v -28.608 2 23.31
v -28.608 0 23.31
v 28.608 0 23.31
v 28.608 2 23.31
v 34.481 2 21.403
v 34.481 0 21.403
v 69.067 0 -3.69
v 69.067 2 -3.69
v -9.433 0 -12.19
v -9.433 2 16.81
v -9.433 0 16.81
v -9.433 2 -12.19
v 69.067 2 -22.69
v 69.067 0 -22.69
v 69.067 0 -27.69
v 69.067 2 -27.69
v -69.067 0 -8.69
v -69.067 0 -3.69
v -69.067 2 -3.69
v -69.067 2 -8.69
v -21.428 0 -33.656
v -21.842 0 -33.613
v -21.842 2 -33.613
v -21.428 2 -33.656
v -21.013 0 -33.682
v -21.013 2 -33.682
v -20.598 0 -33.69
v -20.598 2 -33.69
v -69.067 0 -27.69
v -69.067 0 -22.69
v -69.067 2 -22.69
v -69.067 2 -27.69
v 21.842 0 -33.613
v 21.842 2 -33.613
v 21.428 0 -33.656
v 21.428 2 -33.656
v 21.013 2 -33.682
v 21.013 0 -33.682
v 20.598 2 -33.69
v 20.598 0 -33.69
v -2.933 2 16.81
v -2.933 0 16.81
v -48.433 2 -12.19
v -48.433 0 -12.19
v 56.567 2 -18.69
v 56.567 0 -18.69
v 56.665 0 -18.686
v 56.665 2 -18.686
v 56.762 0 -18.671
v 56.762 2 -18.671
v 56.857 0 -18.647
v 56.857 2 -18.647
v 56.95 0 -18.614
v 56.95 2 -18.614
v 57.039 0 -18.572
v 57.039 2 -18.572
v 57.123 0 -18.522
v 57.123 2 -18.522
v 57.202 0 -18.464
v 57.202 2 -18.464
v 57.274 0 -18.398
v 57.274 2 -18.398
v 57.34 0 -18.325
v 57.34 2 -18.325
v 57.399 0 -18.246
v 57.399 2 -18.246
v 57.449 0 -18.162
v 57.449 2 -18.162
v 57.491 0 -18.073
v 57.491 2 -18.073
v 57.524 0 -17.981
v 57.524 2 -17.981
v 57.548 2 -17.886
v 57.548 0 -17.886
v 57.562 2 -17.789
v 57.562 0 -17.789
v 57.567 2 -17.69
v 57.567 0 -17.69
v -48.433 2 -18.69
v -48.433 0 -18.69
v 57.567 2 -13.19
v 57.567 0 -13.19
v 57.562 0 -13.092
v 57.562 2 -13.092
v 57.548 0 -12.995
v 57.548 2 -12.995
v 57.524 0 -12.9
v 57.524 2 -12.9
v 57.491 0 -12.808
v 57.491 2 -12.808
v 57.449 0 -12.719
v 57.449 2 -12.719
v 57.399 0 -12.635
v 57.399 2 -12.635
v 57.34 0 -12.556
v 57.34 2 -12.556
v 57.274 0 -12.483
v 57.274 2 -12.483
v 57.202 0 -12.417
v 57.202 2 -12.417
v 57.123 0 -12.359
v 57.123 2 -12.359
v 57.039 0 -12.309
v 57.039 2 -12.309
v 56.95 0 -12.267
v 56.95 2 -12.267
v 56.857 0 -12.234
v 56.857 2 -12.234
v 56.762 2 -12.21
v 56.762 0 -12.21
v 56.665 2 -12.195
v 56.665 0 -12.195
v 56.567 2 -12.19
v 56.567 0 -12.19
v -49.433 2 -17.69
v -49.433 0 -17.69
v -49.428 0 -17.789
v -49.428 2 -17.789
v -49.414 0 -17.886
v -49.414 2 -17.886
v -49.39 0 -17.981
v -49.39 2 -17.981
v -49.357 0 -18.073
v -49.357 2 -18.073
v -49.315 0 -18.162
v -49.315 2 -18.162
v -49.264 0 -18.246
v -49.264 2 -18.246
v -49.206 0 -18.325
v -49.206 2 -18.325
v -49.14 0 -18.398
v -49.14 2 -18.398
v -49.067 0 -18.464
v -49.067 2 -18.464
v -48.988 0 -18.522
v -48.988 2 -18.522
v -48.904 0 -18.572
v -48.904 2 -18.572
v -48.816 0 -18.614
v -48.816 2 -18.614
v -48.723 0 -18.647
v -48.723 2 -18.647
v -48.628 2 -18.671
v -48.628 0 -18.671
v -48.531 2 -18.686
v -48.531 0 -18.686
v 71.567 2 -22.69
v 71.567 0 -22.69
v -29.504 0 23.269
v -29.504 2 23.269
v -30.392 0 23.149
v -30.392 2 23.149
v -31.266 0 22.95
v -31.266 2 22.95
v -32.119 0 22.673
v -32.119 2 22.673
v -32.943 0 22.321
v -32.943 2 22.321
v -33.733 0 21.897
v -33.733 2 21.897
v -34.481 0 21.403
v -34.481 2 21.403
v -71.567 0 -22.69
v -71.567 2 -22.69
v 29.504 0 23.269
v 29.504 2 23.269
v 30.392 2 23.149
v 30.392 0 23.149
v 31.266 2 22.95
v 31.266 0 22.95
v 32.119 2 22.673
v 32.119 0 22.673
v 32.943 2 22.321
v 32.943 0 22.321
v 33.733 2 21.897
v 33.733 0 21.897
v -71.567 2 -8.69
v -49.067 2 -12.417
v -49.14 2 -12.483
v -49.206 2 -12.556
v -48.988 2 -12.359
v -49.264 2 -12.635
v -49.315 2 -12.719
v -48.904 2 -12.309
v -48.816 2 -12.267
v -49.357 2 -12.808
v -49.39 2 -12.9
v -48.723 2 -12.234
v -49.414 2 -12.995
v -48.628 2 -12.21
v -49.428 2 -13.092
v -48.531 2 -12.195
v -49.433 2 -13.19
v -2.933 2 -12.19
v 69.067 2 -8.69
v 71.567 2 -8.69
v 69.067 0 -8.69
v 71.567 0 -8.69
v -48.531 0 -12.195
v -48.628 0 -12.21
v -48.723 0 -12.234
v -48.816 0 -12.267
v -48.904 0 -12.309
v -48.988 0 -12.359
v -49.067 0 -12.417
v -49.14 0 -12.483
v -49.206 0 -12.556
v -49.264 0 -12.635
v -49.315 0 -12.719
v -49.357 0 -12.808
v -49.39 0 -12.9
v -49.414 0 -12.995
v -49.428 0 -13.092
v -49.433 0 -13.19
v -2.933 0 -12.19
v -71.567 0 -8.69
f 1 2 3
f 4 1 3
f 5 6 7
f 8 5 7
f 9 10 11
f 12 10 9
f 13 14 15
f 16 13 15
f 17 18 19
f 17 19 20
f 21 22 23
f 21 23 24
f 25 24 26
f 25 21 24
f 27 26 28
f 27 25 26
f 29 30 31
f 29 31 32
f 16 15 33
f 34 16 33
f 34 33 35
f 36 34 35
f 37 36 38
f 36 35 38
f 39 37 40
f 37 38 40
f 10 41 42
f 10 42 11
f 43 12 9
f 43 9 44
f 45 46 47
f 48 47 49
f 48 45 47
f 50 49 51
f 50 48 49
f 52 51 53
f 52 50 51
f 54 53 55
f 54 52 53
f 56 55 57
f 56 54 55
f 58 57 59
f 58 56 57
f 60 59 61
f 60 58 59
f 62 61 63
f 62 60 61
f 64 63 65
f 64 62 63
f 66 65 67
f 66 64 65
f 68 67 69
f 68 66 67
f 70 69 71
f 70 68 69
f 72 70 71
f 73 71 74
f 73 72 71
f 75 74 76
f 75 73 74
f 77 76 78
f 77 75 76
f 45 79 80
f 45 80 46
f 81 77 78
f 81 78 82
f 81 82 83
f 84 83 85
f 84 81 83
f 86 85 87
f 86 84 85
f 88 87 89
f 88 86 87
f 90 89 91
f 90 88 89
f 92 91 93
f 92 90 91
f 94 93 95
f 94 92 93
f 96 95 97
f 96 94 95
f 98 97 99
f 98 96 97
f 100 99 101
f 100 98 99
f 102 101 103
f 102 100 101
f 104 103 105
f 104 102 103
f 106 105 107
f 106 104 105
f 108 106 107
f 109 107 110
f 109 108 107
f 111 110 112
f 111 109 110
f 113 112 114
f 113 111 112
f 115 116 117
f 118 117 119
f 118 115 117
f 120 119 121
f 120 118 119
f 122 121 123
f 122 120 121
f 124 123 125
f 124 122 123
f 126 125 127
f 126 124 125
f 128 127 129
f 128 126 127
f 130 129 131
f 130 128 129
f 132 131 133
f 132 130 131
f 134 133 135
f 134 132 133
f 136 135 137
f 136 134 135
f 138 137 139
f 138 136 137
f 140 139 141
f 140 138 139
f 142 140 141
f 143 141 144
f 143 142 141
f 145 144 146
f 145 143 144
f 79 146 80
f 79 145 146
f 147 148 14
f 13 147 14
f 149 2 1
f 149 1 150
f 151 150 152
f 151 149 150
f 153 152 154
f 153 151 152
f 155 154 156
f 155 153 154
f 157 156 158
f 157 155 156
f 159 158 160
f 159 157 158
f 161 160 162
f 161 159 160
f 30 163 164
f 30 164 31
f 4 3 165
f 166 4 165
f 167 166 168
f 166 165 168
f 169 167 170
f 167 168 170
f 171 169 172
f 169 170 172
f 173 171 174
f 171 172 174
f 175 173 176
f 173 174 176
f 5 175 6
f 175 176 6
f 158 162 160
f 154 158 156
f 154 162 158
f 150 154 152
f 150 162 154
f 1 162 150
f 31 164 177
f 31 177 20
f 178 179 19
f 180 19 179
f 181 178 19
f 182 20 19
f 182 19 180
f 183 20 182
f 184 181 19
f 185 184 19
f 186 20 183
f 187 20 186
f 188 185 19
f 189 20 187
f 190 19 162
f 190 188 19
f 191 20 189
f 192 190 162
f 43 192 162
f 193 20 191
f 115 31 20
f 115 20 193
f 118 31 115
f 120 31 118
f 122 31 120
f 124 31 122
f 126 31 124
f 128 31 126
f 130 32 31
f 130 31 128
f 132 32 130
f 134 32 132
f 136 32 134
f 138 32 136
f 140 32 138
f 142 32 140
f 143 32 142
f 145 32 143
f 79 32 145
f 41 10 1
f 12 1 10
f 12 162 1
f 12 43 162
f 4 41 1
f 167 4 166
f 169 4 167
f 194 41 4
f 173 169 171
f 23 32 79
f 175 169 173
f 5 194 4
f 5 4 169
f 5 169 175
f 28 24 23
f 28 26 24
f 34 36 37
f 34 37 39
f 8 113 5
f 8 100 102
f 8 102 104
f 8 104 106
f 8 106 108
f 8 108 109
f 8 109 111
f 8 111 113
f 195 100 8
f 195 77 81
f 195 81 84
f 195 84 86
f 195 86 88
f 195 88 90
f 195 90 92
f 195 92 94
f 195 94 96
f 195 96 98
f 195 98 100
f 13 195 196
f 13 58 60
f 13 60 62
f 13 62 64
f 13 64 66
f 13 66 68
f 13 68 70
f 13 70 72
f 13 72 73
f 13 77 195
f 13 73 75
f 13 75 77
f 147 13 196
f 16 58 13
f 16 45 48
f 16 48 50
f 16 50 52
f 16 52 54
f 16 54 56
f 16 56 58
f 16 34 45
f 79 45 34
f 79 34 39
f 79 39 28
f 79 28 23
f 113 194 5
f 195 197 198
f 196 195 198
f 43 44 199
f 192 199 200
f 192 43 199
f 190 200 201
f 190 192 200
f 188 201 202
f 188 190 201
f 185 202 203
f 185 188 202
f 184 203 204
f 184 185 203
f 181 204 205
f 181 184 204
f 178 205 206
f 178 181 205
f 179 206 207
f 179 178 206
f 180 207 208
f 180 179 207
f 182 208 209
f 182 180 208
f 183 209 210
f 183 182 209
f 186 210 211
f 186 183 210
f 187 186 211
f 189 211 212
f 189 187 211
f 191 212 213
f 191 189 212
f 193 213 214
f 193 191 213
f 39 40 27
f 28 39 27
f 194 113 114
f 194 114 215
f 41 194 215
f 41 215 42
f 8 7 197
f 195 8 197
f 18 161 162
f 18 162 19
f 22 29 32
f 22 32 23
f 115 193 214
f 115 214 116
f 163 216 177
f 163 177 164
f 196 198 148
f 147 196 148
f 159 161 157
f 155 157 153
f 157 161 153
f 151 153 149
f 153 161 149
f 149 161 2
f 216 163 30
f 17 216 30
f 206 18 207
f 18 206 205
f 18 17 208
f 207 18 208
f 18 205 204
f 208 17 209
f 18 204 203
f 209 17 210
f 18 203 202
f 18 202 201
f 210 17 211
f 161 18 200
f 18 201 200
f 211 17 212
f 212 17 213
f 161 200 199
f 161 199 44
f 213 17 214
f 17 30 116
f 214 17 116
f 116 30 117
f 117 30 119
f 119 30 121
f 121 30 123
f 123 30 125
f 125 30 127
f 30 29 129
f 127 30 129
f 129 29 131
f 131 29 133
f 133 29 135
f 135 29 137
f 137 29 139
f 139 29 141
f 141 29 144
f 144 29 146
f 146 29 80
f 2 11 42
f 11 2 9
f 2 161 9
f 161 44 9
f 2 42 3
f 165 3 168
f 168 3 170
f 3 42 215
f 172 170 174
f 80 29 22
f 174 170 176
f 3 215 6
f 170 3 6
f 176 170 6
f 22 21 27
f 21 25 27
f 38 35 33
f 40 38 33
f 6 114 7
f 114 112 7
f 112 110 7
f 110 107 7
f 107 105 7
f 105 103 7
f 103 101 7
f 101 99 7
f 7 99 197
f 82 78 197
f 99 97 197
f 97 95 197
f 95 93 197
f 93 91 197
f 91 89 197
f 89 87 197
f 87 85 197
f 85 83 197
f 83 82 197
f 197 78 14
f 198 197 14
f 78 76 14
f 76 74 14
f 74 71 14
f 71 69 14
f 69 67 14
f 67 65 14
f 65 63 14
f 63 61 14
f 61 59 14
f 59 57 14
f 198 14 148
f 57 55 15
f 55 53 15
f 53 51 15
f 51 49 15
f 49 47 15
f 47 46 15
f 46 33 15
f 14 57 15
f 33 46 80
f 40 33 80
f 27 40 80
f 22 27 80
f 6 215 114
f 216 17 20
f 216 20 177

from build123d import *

# Parameters (mm, degrees)
RESSALTO_EXTRUS_O1_DEPTH = 2
CORTE_EXTRUS_O1_DEPTH    = 3


with BuildPart() as part:
    # Esboço1 → Ressalto-extrusão1 (new body)
    with BuildSketch(Plane(origin=(0, 0, 0), x_dir=(1, 0, 0), z_dir=(0, 1, 0))):
        with BuildLine():
            Line((-69.067178301, 27.690493718), (-21.84180506, 33.612777476))
            ThreePointArc((-21.84180506, 33.612777476), (-21.220866866, 33.671045747), (-20.597504043, 33.690493718))
            Line((-20.597504043, 33.690493718), (0, 33.690493718))
            Line((0, 33.690493718), (0, -23.309506282))
            Line((0, -23.309506282), (-28.608479685, -23.309506282))
            ThreePointArc((-28.608479685, -23.309506282), (-31.695562463, -22.821073972), (-34.481079048, -21.403490265))
            Line((-34.481079048, -21.403490265), (-69.067178301, 3.690493718))
            Line((-69.067178301, 3.690493718), (-69.067178301, 8.690493718))
            Line((-69.067178301, 8.690493718), (-71.567178301, 8.690493718))
            Line((-71.567178301, 8.690493718), (-71.567178301, 22.690493718))
            Line((-71.567178301, 22.690493718), (-69.067178301, 22.690493718))
            Line((-69.067178301, 22.690493718), (-69.067178301, 27.690493718))
        make_face()
    ressalto_extrus_o1 = extrude(amount=RESSALTO_EXTRUS_O1_DEPTH)

    # Espelhar1: Ressalto-extrusão1 across plane
    add(ressalto_extrus_o1.mirror(Plane(origin=(0, 2, 23.309506282), x_dir=(0, 0, 1), z_dir=(-1, 0, 0))))

    # Esboço2 → Corte-extrusão1 (cut, through all)
    with BuildSketch(Plane(origin=(0, 2, 0), x_dir=(1, 0, 0), z_dir=(0, 1, 0))):
        with BuildLine():
            Line((-48.432821699, 18.690493718), (56.567178301, 18.690493718))
            ThreePointArc((56.567178301, 18.690493718), (57.274285082, 18.397600499), (57.567178301, 17.690493718))
            Line((57.567178301, 17.690493718), (57.567178301, 13.190493718))
            ThreePointArc((57.567178301, 13.190493718), (57.274285082, 12.483386937), (56.567178301, 12.190493718))
            Line((56.567178301, 12.190493718), (-2.932821699, 12.190493718))
            Line((-2.932821699, 12.190493718), (-2.932821699, -16.809506282))
            Line((-2.932821699, -16.809506282), (-9.432821699, -16.809506282))
            Line((-9.432821699, -16.809506282), (-9.432821699, 12.190493718))
            Line((-9.432821699, 12.190493718), (-48.432821699, 12.190493718))
            ThreePointArc((-48.432821699, 12.190493718), (-49.13992848, 12.483386937), (-49.432821699, 13.190493718))
            Line((-49.432821699, 13.190493718), (-49.432821699, 17.690493718))
            ThreePointArc((-49.432821699, 17.690493718), (-49.13992848, 18.397600499), (-48.432821699, 18.690493718))
        make_face()
    extrude(amount=-CORTE_EXTRUS_O1_DEPTH, mode=Mode.SUBTRACT)


solid = part.part
